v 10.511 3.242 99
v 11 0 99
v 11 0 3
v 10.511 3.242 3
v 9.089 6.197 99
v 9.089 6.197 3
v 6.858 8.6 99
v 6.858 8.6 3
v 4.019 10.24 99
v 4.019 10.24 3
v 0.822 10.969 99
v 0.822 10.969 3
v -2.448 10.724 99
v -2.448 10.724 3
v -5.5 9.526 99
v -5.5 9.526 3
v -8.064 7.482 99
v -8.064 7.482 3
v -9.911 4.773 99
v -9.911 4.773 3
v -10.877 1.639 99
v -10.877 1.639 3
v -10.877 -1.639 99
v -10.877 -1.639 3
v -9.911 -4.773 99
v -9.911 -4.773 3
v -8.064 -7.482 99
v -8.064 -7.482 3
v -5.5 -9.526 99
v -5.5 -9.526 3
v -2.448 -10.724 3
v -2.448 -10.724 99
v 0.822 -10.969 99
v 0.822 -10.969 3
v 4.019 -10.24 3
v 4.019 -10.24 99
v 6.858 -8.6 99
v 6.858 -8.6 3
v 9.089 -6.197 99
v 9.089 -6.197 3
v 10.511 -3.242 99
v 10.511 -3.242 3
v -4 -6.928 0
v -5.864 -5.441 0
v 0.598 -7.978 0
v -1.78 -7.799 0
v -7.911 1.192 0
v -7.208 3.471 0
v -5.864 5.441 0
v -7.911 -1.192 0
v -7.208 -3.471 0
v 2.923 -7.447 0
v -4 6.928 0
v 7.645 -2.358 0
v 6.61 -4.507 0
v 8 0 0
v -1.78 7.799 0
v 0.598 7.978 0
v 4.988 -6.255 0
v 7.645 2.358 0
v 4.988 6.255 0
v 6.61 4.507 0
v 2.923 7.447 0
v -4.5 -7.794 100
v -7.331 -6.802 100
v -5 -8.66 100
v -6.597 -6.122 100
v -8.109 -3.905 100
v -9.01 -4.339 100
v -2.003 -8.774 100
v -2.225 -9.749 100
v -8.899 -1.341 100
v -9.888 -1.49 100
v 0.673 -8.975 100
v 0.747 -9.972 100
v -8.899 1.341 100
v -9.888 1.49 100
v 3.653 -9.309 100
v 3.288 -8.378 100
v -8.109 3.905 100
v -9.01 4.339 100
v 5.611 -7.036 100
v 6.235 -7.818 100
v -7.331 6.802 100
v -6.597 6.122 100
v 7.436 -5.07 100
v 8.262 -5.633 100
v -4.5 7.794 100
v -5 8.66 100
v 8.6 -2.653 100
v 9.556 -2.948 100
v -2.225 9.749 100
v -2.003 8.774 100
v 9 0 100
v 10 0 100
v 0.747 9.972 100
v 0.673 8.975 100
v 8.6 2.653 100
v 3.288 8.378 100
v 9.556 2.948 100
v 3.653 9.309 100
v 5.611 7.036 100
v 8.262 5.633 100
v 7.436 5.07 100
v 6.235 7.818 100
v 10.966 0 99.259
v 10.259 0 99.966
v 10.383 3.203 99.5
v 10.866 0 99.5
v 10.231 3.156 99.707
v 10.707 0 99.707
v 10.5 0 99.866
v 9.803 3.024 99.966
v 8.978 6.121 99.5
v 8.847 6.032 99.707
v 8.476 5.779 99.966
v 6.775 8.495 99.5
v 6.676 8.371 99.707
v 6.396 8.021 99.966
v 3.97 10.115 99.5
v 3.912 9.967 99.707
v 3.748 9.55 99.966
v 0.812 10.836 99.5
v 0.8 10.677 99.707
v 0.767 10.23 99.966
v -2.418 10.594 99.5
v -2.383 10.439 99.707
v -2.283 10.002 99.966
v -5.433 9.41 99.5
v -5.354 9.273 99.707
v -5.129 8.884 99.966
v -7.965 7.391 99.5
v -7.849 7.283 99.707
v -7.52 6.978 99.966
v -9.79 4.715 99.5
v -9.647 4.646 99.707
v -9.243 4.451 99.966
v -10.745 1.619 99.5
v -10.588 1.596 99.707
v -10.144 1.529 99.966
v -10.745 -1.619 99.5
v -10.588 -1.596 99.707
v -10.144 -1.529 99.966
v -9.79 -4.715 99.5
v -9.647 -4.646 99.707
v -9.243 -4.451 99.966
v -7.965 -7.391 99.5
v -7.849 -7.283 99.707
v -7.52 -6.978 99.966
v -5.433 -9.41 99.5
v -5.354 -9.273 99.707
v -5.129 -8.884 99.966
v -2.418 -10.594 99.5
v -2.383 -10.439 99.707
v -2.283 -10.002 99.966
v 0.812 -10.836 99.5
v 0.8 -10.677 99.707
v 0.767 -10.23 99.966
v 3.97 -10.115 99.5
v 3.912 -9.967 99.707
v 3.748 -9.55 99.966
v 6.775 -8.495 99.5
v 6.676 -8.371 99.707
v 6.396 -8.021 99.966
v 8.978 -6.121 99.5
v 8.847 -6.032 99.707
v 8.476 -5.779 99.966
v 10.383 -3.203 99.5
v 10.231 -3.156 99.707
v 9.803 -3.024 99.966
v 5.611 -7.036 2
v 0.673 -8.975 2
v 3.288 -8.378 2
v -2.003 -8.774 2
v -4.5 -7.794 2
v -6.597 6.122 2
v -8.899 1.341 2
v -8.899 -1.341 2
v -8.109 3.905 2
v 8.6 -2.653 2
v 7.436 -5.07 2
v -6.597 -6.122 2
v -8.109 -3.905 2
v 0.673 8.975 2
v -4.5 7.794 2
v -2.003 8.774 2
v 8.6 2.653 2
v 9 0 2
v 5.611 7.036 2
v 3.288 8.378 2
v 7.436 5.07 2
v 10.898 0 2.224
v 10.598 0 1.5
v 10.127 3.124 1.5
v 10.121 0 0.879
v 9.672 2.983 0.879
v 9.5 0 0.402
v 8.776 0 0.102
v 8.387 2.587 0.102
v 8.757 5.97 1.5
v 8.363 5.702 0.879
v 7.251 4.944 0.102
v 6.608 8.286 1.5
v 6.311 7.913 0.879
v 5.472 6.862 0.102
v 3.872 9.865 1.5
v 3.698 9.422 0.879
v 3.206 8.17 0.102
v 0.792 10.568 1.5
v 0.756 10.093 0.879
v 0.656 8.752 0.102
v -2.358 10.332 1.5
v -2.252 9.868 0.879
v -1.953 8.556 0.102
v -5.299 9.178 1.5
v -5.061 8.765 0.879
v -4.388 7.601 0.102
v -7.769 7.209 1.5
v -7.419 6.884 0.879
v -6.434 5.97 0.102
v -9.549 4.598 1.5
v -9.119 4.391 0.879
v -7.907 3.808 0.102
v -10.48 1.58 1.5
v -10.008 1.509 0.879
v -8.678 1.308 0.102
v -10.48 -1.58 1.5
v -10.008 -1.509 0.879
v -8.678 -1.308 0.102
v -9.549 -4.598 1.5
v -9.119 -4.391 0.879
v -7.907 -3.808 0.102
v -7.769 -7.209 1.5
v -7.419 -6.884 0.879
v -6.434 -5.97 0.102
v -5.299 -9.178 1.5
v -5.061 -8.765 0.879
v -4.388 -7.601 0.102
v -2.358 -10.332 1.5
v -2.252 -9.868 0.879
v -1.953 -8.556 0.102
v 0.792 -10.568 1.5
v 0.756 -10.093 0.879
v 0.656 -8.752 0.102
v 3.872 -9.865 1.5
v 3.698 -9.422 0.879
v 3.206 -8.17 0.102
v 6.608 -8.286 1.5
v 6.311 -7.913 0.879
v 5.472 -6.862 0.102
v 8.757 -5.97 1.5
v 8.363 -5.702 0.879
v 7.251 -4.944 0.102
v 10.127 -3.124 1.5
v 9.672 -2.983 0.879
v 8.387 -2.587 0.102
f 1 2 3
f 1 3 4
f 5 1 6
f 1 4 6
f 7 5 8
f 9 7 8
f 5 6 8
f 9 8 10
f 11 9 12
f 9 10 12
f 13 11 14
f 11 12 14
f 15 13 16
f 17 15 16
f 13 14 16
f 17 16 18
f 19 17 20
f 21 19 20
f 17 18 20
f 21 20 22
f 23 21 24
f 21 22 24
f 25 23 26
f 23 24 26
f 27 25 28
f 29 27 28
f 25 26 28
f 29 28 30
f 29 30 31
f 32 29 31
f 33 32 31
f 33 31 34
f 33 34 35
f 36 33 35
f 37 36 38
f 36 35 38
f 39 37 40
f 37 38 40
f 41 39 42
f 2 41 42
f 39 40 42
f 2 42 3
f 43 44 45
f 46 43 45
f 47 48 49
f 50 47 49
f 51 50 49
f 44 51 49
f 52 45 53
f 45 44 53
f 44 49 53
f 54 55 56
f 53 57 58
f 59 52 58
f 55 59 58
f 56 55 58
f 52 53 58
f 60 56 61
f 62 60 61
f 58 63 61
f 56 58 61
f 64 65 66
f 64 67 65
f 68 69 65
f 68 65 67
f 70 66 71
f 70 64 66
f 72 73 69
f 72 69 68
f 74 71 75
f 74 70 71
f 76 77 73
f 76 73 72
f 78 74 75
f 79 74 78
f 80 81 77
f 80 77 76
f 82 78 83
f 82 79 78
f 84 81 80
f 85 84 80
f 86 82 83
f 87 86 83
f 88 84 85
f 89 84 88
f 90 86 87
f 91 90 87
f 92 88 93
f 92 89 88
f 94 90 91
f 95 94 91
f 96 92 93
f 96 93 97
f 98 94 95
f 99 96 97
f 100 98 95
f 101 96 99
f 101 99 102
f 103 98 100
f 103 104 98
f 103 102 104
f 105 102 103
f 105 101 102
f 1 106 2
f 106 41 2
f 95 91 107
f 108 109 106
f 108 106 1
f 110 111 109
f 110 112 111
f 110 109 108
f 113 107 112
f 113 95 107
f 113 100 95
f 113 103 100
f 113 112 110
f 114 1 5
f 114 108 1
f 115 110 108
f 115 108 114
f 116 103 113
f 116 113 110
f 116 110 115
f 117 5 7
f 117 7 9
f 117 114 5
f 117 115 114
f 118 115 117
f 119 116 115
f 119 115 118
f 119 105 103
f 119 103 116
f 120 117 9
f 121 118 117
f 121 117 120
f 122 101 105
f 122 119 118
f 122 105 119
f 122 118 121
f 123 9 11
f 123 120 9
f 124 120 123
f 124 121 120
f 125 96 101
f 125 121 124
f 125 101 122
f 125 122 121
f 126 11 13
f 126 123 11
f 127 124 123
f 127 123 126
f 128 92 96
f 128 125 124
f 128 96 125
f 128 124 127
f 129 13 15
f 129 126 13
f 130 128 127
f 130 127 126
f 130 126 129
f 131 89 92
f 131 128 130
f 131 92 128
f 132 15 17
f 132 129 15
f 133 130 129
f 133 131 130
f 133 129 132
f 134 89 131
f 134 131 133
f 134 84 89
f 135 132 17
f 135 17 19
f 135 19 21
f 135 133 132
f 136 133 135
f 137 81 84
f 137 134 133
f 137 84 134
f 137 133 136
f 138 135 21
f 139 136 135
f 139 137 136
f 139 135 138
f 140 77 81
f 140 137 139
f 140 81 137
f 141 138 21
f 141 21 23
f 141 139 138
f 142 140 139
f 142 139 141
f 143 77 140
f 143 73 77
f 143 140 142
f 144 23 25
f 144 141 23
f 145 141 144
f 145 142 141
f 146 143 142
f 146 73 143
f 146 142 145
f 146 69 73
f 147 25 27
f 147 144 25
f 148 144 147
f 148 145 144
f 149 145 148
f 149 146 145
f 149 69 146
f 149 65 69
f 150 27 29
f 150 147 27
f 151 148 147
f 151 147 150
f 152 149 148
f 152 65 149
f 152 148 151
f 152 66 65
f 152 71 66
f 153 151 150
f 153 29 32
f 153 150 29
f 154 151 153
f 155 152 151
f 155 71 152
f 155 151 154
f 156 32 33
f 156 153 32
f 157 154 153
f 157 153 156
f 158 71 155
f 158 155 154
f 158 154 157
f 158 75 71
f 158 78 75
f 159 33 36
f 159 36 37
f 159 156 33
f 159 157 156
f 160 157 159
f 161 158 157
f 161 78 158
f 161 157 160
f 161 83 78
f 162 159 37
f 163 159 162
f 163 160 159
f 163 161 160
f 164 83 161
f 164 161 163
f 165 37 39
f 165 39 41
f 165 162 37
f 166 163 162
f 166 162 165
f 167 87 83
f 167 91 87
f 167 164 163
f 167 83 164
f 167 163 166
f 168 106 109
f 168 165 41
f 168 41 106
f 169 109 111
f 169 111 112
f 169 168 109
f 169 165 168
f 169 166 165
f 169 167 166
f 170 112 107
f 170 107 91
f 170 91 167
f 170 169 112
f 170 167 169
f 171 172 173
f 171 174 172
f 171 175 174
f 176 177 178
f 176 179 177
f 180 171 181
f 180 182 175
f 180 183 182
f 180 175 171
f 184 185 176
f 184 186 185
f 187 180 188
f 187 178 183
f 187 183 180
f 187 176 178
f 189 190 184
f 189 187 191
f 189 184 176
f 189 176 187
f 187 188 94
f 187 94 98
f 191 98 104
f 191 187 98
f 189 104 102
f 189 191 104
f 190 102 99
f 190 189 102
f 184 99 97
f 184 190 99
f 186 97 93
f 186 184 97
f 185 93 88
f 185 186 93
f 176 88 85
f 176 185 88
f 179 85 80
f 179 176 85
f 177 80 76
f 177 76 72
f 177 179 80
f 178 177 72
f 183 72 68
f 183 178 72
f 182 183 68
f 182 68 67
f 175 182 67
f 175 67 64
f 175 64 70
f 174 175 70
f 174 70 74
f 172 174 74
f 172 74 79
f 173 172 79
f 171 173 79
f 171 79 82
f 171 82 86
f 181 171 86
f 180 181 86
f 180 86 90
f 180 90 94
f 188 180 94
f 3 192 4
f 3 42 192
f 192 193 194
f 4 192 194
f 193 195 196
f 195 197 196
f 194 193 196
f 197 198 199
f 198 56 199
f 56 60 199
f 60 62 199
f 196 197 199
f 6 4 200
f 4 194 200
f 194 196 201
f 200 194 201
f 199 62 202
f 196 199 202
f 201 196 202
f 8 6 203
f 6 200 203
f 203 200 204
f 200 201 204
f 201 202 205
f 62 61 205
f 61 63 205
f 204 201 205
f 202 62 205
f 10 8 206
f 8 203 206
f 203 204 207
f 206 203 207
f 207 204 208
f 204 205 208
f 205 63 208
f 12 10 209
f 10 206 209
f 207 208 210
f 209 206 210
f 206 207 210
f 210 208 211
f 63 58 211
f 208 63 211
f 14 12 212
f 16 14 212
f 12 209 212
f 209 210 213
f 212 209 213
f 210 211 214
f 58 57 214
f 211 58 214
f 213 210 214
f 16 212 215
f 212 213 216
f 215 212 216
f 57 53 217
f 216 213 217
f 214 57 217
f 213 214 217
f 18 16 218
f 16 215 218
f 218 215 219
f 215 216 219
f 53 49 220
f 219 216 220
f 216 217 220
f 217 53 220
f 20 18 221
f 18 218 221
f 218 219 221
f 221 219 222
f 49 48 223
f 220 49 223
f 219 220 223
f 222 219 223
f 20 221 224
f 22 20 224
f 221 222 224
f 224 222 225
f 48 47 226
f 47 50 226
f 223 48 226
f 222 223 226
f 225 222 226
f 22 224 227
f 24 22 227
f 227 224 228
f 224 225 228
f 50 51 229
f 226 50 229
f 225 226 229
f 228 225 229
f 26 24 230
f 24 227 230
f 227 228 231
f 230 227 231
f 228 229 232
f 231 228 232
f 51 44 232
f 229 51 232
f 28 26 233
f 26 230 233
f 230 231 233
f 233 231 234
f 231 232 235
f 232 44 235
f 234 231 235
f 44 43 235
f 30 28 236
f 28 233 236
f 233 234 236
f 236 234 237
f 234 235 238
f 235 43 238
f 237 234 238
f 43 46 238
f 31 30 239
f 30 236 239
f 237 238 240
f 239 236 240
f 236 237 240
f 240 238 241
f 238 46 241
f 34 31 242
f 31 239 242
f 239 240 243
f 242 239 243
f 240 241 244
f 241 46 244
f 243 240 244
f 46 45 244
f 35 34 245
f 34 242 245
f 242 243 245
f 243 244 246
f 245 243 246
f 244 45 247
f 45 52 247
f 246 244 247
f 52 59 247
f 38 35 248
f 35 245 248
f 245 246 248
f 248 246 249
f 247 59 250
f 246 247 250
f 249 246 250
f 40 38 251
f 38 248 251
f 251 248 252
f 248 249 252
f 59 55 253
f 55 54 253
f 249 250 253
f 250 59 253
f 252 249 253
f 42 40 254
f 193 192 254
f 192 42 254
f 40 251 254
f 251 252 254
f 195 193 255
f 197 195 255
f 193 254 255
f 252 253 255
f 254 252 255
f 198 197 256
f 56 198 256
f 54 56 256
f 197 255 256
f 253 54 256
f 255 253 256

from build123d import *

# Parameters (mm, degrees)
F0_R     = 11
F1_DEPTH = 100
F2_T     = -2
F3_R     = 3
F4_R     = 1


with BuildPart() as f1:
    # F0 (on Top) → F1 (new body)
    with BuildSketch(Plane.XY):
        Circle(F0_R)
    extrude(amount=F1_DEPTH)

    # F2
    f2_openings = [f1.faces().sort_by_distance(p)[0] for p in [
        (0, 0, 100),
    ]]
    offset(amount=F2_T, openings=f2_openings)

    # F3
    f3_edges = [f1.edges().sort_by_distance(p)[0] for p in [
        (-11, 0, 0),
    ]]
    fillet(f3_edges, radius=F3_R)

    # F4
    f4_edges = [f1.edges().sort_by_distance(p)[0] for p in [
        (-11, 0, 100),
    ]]
    fillet(f4_edges, radius=F4_R)


solid = f1.part
